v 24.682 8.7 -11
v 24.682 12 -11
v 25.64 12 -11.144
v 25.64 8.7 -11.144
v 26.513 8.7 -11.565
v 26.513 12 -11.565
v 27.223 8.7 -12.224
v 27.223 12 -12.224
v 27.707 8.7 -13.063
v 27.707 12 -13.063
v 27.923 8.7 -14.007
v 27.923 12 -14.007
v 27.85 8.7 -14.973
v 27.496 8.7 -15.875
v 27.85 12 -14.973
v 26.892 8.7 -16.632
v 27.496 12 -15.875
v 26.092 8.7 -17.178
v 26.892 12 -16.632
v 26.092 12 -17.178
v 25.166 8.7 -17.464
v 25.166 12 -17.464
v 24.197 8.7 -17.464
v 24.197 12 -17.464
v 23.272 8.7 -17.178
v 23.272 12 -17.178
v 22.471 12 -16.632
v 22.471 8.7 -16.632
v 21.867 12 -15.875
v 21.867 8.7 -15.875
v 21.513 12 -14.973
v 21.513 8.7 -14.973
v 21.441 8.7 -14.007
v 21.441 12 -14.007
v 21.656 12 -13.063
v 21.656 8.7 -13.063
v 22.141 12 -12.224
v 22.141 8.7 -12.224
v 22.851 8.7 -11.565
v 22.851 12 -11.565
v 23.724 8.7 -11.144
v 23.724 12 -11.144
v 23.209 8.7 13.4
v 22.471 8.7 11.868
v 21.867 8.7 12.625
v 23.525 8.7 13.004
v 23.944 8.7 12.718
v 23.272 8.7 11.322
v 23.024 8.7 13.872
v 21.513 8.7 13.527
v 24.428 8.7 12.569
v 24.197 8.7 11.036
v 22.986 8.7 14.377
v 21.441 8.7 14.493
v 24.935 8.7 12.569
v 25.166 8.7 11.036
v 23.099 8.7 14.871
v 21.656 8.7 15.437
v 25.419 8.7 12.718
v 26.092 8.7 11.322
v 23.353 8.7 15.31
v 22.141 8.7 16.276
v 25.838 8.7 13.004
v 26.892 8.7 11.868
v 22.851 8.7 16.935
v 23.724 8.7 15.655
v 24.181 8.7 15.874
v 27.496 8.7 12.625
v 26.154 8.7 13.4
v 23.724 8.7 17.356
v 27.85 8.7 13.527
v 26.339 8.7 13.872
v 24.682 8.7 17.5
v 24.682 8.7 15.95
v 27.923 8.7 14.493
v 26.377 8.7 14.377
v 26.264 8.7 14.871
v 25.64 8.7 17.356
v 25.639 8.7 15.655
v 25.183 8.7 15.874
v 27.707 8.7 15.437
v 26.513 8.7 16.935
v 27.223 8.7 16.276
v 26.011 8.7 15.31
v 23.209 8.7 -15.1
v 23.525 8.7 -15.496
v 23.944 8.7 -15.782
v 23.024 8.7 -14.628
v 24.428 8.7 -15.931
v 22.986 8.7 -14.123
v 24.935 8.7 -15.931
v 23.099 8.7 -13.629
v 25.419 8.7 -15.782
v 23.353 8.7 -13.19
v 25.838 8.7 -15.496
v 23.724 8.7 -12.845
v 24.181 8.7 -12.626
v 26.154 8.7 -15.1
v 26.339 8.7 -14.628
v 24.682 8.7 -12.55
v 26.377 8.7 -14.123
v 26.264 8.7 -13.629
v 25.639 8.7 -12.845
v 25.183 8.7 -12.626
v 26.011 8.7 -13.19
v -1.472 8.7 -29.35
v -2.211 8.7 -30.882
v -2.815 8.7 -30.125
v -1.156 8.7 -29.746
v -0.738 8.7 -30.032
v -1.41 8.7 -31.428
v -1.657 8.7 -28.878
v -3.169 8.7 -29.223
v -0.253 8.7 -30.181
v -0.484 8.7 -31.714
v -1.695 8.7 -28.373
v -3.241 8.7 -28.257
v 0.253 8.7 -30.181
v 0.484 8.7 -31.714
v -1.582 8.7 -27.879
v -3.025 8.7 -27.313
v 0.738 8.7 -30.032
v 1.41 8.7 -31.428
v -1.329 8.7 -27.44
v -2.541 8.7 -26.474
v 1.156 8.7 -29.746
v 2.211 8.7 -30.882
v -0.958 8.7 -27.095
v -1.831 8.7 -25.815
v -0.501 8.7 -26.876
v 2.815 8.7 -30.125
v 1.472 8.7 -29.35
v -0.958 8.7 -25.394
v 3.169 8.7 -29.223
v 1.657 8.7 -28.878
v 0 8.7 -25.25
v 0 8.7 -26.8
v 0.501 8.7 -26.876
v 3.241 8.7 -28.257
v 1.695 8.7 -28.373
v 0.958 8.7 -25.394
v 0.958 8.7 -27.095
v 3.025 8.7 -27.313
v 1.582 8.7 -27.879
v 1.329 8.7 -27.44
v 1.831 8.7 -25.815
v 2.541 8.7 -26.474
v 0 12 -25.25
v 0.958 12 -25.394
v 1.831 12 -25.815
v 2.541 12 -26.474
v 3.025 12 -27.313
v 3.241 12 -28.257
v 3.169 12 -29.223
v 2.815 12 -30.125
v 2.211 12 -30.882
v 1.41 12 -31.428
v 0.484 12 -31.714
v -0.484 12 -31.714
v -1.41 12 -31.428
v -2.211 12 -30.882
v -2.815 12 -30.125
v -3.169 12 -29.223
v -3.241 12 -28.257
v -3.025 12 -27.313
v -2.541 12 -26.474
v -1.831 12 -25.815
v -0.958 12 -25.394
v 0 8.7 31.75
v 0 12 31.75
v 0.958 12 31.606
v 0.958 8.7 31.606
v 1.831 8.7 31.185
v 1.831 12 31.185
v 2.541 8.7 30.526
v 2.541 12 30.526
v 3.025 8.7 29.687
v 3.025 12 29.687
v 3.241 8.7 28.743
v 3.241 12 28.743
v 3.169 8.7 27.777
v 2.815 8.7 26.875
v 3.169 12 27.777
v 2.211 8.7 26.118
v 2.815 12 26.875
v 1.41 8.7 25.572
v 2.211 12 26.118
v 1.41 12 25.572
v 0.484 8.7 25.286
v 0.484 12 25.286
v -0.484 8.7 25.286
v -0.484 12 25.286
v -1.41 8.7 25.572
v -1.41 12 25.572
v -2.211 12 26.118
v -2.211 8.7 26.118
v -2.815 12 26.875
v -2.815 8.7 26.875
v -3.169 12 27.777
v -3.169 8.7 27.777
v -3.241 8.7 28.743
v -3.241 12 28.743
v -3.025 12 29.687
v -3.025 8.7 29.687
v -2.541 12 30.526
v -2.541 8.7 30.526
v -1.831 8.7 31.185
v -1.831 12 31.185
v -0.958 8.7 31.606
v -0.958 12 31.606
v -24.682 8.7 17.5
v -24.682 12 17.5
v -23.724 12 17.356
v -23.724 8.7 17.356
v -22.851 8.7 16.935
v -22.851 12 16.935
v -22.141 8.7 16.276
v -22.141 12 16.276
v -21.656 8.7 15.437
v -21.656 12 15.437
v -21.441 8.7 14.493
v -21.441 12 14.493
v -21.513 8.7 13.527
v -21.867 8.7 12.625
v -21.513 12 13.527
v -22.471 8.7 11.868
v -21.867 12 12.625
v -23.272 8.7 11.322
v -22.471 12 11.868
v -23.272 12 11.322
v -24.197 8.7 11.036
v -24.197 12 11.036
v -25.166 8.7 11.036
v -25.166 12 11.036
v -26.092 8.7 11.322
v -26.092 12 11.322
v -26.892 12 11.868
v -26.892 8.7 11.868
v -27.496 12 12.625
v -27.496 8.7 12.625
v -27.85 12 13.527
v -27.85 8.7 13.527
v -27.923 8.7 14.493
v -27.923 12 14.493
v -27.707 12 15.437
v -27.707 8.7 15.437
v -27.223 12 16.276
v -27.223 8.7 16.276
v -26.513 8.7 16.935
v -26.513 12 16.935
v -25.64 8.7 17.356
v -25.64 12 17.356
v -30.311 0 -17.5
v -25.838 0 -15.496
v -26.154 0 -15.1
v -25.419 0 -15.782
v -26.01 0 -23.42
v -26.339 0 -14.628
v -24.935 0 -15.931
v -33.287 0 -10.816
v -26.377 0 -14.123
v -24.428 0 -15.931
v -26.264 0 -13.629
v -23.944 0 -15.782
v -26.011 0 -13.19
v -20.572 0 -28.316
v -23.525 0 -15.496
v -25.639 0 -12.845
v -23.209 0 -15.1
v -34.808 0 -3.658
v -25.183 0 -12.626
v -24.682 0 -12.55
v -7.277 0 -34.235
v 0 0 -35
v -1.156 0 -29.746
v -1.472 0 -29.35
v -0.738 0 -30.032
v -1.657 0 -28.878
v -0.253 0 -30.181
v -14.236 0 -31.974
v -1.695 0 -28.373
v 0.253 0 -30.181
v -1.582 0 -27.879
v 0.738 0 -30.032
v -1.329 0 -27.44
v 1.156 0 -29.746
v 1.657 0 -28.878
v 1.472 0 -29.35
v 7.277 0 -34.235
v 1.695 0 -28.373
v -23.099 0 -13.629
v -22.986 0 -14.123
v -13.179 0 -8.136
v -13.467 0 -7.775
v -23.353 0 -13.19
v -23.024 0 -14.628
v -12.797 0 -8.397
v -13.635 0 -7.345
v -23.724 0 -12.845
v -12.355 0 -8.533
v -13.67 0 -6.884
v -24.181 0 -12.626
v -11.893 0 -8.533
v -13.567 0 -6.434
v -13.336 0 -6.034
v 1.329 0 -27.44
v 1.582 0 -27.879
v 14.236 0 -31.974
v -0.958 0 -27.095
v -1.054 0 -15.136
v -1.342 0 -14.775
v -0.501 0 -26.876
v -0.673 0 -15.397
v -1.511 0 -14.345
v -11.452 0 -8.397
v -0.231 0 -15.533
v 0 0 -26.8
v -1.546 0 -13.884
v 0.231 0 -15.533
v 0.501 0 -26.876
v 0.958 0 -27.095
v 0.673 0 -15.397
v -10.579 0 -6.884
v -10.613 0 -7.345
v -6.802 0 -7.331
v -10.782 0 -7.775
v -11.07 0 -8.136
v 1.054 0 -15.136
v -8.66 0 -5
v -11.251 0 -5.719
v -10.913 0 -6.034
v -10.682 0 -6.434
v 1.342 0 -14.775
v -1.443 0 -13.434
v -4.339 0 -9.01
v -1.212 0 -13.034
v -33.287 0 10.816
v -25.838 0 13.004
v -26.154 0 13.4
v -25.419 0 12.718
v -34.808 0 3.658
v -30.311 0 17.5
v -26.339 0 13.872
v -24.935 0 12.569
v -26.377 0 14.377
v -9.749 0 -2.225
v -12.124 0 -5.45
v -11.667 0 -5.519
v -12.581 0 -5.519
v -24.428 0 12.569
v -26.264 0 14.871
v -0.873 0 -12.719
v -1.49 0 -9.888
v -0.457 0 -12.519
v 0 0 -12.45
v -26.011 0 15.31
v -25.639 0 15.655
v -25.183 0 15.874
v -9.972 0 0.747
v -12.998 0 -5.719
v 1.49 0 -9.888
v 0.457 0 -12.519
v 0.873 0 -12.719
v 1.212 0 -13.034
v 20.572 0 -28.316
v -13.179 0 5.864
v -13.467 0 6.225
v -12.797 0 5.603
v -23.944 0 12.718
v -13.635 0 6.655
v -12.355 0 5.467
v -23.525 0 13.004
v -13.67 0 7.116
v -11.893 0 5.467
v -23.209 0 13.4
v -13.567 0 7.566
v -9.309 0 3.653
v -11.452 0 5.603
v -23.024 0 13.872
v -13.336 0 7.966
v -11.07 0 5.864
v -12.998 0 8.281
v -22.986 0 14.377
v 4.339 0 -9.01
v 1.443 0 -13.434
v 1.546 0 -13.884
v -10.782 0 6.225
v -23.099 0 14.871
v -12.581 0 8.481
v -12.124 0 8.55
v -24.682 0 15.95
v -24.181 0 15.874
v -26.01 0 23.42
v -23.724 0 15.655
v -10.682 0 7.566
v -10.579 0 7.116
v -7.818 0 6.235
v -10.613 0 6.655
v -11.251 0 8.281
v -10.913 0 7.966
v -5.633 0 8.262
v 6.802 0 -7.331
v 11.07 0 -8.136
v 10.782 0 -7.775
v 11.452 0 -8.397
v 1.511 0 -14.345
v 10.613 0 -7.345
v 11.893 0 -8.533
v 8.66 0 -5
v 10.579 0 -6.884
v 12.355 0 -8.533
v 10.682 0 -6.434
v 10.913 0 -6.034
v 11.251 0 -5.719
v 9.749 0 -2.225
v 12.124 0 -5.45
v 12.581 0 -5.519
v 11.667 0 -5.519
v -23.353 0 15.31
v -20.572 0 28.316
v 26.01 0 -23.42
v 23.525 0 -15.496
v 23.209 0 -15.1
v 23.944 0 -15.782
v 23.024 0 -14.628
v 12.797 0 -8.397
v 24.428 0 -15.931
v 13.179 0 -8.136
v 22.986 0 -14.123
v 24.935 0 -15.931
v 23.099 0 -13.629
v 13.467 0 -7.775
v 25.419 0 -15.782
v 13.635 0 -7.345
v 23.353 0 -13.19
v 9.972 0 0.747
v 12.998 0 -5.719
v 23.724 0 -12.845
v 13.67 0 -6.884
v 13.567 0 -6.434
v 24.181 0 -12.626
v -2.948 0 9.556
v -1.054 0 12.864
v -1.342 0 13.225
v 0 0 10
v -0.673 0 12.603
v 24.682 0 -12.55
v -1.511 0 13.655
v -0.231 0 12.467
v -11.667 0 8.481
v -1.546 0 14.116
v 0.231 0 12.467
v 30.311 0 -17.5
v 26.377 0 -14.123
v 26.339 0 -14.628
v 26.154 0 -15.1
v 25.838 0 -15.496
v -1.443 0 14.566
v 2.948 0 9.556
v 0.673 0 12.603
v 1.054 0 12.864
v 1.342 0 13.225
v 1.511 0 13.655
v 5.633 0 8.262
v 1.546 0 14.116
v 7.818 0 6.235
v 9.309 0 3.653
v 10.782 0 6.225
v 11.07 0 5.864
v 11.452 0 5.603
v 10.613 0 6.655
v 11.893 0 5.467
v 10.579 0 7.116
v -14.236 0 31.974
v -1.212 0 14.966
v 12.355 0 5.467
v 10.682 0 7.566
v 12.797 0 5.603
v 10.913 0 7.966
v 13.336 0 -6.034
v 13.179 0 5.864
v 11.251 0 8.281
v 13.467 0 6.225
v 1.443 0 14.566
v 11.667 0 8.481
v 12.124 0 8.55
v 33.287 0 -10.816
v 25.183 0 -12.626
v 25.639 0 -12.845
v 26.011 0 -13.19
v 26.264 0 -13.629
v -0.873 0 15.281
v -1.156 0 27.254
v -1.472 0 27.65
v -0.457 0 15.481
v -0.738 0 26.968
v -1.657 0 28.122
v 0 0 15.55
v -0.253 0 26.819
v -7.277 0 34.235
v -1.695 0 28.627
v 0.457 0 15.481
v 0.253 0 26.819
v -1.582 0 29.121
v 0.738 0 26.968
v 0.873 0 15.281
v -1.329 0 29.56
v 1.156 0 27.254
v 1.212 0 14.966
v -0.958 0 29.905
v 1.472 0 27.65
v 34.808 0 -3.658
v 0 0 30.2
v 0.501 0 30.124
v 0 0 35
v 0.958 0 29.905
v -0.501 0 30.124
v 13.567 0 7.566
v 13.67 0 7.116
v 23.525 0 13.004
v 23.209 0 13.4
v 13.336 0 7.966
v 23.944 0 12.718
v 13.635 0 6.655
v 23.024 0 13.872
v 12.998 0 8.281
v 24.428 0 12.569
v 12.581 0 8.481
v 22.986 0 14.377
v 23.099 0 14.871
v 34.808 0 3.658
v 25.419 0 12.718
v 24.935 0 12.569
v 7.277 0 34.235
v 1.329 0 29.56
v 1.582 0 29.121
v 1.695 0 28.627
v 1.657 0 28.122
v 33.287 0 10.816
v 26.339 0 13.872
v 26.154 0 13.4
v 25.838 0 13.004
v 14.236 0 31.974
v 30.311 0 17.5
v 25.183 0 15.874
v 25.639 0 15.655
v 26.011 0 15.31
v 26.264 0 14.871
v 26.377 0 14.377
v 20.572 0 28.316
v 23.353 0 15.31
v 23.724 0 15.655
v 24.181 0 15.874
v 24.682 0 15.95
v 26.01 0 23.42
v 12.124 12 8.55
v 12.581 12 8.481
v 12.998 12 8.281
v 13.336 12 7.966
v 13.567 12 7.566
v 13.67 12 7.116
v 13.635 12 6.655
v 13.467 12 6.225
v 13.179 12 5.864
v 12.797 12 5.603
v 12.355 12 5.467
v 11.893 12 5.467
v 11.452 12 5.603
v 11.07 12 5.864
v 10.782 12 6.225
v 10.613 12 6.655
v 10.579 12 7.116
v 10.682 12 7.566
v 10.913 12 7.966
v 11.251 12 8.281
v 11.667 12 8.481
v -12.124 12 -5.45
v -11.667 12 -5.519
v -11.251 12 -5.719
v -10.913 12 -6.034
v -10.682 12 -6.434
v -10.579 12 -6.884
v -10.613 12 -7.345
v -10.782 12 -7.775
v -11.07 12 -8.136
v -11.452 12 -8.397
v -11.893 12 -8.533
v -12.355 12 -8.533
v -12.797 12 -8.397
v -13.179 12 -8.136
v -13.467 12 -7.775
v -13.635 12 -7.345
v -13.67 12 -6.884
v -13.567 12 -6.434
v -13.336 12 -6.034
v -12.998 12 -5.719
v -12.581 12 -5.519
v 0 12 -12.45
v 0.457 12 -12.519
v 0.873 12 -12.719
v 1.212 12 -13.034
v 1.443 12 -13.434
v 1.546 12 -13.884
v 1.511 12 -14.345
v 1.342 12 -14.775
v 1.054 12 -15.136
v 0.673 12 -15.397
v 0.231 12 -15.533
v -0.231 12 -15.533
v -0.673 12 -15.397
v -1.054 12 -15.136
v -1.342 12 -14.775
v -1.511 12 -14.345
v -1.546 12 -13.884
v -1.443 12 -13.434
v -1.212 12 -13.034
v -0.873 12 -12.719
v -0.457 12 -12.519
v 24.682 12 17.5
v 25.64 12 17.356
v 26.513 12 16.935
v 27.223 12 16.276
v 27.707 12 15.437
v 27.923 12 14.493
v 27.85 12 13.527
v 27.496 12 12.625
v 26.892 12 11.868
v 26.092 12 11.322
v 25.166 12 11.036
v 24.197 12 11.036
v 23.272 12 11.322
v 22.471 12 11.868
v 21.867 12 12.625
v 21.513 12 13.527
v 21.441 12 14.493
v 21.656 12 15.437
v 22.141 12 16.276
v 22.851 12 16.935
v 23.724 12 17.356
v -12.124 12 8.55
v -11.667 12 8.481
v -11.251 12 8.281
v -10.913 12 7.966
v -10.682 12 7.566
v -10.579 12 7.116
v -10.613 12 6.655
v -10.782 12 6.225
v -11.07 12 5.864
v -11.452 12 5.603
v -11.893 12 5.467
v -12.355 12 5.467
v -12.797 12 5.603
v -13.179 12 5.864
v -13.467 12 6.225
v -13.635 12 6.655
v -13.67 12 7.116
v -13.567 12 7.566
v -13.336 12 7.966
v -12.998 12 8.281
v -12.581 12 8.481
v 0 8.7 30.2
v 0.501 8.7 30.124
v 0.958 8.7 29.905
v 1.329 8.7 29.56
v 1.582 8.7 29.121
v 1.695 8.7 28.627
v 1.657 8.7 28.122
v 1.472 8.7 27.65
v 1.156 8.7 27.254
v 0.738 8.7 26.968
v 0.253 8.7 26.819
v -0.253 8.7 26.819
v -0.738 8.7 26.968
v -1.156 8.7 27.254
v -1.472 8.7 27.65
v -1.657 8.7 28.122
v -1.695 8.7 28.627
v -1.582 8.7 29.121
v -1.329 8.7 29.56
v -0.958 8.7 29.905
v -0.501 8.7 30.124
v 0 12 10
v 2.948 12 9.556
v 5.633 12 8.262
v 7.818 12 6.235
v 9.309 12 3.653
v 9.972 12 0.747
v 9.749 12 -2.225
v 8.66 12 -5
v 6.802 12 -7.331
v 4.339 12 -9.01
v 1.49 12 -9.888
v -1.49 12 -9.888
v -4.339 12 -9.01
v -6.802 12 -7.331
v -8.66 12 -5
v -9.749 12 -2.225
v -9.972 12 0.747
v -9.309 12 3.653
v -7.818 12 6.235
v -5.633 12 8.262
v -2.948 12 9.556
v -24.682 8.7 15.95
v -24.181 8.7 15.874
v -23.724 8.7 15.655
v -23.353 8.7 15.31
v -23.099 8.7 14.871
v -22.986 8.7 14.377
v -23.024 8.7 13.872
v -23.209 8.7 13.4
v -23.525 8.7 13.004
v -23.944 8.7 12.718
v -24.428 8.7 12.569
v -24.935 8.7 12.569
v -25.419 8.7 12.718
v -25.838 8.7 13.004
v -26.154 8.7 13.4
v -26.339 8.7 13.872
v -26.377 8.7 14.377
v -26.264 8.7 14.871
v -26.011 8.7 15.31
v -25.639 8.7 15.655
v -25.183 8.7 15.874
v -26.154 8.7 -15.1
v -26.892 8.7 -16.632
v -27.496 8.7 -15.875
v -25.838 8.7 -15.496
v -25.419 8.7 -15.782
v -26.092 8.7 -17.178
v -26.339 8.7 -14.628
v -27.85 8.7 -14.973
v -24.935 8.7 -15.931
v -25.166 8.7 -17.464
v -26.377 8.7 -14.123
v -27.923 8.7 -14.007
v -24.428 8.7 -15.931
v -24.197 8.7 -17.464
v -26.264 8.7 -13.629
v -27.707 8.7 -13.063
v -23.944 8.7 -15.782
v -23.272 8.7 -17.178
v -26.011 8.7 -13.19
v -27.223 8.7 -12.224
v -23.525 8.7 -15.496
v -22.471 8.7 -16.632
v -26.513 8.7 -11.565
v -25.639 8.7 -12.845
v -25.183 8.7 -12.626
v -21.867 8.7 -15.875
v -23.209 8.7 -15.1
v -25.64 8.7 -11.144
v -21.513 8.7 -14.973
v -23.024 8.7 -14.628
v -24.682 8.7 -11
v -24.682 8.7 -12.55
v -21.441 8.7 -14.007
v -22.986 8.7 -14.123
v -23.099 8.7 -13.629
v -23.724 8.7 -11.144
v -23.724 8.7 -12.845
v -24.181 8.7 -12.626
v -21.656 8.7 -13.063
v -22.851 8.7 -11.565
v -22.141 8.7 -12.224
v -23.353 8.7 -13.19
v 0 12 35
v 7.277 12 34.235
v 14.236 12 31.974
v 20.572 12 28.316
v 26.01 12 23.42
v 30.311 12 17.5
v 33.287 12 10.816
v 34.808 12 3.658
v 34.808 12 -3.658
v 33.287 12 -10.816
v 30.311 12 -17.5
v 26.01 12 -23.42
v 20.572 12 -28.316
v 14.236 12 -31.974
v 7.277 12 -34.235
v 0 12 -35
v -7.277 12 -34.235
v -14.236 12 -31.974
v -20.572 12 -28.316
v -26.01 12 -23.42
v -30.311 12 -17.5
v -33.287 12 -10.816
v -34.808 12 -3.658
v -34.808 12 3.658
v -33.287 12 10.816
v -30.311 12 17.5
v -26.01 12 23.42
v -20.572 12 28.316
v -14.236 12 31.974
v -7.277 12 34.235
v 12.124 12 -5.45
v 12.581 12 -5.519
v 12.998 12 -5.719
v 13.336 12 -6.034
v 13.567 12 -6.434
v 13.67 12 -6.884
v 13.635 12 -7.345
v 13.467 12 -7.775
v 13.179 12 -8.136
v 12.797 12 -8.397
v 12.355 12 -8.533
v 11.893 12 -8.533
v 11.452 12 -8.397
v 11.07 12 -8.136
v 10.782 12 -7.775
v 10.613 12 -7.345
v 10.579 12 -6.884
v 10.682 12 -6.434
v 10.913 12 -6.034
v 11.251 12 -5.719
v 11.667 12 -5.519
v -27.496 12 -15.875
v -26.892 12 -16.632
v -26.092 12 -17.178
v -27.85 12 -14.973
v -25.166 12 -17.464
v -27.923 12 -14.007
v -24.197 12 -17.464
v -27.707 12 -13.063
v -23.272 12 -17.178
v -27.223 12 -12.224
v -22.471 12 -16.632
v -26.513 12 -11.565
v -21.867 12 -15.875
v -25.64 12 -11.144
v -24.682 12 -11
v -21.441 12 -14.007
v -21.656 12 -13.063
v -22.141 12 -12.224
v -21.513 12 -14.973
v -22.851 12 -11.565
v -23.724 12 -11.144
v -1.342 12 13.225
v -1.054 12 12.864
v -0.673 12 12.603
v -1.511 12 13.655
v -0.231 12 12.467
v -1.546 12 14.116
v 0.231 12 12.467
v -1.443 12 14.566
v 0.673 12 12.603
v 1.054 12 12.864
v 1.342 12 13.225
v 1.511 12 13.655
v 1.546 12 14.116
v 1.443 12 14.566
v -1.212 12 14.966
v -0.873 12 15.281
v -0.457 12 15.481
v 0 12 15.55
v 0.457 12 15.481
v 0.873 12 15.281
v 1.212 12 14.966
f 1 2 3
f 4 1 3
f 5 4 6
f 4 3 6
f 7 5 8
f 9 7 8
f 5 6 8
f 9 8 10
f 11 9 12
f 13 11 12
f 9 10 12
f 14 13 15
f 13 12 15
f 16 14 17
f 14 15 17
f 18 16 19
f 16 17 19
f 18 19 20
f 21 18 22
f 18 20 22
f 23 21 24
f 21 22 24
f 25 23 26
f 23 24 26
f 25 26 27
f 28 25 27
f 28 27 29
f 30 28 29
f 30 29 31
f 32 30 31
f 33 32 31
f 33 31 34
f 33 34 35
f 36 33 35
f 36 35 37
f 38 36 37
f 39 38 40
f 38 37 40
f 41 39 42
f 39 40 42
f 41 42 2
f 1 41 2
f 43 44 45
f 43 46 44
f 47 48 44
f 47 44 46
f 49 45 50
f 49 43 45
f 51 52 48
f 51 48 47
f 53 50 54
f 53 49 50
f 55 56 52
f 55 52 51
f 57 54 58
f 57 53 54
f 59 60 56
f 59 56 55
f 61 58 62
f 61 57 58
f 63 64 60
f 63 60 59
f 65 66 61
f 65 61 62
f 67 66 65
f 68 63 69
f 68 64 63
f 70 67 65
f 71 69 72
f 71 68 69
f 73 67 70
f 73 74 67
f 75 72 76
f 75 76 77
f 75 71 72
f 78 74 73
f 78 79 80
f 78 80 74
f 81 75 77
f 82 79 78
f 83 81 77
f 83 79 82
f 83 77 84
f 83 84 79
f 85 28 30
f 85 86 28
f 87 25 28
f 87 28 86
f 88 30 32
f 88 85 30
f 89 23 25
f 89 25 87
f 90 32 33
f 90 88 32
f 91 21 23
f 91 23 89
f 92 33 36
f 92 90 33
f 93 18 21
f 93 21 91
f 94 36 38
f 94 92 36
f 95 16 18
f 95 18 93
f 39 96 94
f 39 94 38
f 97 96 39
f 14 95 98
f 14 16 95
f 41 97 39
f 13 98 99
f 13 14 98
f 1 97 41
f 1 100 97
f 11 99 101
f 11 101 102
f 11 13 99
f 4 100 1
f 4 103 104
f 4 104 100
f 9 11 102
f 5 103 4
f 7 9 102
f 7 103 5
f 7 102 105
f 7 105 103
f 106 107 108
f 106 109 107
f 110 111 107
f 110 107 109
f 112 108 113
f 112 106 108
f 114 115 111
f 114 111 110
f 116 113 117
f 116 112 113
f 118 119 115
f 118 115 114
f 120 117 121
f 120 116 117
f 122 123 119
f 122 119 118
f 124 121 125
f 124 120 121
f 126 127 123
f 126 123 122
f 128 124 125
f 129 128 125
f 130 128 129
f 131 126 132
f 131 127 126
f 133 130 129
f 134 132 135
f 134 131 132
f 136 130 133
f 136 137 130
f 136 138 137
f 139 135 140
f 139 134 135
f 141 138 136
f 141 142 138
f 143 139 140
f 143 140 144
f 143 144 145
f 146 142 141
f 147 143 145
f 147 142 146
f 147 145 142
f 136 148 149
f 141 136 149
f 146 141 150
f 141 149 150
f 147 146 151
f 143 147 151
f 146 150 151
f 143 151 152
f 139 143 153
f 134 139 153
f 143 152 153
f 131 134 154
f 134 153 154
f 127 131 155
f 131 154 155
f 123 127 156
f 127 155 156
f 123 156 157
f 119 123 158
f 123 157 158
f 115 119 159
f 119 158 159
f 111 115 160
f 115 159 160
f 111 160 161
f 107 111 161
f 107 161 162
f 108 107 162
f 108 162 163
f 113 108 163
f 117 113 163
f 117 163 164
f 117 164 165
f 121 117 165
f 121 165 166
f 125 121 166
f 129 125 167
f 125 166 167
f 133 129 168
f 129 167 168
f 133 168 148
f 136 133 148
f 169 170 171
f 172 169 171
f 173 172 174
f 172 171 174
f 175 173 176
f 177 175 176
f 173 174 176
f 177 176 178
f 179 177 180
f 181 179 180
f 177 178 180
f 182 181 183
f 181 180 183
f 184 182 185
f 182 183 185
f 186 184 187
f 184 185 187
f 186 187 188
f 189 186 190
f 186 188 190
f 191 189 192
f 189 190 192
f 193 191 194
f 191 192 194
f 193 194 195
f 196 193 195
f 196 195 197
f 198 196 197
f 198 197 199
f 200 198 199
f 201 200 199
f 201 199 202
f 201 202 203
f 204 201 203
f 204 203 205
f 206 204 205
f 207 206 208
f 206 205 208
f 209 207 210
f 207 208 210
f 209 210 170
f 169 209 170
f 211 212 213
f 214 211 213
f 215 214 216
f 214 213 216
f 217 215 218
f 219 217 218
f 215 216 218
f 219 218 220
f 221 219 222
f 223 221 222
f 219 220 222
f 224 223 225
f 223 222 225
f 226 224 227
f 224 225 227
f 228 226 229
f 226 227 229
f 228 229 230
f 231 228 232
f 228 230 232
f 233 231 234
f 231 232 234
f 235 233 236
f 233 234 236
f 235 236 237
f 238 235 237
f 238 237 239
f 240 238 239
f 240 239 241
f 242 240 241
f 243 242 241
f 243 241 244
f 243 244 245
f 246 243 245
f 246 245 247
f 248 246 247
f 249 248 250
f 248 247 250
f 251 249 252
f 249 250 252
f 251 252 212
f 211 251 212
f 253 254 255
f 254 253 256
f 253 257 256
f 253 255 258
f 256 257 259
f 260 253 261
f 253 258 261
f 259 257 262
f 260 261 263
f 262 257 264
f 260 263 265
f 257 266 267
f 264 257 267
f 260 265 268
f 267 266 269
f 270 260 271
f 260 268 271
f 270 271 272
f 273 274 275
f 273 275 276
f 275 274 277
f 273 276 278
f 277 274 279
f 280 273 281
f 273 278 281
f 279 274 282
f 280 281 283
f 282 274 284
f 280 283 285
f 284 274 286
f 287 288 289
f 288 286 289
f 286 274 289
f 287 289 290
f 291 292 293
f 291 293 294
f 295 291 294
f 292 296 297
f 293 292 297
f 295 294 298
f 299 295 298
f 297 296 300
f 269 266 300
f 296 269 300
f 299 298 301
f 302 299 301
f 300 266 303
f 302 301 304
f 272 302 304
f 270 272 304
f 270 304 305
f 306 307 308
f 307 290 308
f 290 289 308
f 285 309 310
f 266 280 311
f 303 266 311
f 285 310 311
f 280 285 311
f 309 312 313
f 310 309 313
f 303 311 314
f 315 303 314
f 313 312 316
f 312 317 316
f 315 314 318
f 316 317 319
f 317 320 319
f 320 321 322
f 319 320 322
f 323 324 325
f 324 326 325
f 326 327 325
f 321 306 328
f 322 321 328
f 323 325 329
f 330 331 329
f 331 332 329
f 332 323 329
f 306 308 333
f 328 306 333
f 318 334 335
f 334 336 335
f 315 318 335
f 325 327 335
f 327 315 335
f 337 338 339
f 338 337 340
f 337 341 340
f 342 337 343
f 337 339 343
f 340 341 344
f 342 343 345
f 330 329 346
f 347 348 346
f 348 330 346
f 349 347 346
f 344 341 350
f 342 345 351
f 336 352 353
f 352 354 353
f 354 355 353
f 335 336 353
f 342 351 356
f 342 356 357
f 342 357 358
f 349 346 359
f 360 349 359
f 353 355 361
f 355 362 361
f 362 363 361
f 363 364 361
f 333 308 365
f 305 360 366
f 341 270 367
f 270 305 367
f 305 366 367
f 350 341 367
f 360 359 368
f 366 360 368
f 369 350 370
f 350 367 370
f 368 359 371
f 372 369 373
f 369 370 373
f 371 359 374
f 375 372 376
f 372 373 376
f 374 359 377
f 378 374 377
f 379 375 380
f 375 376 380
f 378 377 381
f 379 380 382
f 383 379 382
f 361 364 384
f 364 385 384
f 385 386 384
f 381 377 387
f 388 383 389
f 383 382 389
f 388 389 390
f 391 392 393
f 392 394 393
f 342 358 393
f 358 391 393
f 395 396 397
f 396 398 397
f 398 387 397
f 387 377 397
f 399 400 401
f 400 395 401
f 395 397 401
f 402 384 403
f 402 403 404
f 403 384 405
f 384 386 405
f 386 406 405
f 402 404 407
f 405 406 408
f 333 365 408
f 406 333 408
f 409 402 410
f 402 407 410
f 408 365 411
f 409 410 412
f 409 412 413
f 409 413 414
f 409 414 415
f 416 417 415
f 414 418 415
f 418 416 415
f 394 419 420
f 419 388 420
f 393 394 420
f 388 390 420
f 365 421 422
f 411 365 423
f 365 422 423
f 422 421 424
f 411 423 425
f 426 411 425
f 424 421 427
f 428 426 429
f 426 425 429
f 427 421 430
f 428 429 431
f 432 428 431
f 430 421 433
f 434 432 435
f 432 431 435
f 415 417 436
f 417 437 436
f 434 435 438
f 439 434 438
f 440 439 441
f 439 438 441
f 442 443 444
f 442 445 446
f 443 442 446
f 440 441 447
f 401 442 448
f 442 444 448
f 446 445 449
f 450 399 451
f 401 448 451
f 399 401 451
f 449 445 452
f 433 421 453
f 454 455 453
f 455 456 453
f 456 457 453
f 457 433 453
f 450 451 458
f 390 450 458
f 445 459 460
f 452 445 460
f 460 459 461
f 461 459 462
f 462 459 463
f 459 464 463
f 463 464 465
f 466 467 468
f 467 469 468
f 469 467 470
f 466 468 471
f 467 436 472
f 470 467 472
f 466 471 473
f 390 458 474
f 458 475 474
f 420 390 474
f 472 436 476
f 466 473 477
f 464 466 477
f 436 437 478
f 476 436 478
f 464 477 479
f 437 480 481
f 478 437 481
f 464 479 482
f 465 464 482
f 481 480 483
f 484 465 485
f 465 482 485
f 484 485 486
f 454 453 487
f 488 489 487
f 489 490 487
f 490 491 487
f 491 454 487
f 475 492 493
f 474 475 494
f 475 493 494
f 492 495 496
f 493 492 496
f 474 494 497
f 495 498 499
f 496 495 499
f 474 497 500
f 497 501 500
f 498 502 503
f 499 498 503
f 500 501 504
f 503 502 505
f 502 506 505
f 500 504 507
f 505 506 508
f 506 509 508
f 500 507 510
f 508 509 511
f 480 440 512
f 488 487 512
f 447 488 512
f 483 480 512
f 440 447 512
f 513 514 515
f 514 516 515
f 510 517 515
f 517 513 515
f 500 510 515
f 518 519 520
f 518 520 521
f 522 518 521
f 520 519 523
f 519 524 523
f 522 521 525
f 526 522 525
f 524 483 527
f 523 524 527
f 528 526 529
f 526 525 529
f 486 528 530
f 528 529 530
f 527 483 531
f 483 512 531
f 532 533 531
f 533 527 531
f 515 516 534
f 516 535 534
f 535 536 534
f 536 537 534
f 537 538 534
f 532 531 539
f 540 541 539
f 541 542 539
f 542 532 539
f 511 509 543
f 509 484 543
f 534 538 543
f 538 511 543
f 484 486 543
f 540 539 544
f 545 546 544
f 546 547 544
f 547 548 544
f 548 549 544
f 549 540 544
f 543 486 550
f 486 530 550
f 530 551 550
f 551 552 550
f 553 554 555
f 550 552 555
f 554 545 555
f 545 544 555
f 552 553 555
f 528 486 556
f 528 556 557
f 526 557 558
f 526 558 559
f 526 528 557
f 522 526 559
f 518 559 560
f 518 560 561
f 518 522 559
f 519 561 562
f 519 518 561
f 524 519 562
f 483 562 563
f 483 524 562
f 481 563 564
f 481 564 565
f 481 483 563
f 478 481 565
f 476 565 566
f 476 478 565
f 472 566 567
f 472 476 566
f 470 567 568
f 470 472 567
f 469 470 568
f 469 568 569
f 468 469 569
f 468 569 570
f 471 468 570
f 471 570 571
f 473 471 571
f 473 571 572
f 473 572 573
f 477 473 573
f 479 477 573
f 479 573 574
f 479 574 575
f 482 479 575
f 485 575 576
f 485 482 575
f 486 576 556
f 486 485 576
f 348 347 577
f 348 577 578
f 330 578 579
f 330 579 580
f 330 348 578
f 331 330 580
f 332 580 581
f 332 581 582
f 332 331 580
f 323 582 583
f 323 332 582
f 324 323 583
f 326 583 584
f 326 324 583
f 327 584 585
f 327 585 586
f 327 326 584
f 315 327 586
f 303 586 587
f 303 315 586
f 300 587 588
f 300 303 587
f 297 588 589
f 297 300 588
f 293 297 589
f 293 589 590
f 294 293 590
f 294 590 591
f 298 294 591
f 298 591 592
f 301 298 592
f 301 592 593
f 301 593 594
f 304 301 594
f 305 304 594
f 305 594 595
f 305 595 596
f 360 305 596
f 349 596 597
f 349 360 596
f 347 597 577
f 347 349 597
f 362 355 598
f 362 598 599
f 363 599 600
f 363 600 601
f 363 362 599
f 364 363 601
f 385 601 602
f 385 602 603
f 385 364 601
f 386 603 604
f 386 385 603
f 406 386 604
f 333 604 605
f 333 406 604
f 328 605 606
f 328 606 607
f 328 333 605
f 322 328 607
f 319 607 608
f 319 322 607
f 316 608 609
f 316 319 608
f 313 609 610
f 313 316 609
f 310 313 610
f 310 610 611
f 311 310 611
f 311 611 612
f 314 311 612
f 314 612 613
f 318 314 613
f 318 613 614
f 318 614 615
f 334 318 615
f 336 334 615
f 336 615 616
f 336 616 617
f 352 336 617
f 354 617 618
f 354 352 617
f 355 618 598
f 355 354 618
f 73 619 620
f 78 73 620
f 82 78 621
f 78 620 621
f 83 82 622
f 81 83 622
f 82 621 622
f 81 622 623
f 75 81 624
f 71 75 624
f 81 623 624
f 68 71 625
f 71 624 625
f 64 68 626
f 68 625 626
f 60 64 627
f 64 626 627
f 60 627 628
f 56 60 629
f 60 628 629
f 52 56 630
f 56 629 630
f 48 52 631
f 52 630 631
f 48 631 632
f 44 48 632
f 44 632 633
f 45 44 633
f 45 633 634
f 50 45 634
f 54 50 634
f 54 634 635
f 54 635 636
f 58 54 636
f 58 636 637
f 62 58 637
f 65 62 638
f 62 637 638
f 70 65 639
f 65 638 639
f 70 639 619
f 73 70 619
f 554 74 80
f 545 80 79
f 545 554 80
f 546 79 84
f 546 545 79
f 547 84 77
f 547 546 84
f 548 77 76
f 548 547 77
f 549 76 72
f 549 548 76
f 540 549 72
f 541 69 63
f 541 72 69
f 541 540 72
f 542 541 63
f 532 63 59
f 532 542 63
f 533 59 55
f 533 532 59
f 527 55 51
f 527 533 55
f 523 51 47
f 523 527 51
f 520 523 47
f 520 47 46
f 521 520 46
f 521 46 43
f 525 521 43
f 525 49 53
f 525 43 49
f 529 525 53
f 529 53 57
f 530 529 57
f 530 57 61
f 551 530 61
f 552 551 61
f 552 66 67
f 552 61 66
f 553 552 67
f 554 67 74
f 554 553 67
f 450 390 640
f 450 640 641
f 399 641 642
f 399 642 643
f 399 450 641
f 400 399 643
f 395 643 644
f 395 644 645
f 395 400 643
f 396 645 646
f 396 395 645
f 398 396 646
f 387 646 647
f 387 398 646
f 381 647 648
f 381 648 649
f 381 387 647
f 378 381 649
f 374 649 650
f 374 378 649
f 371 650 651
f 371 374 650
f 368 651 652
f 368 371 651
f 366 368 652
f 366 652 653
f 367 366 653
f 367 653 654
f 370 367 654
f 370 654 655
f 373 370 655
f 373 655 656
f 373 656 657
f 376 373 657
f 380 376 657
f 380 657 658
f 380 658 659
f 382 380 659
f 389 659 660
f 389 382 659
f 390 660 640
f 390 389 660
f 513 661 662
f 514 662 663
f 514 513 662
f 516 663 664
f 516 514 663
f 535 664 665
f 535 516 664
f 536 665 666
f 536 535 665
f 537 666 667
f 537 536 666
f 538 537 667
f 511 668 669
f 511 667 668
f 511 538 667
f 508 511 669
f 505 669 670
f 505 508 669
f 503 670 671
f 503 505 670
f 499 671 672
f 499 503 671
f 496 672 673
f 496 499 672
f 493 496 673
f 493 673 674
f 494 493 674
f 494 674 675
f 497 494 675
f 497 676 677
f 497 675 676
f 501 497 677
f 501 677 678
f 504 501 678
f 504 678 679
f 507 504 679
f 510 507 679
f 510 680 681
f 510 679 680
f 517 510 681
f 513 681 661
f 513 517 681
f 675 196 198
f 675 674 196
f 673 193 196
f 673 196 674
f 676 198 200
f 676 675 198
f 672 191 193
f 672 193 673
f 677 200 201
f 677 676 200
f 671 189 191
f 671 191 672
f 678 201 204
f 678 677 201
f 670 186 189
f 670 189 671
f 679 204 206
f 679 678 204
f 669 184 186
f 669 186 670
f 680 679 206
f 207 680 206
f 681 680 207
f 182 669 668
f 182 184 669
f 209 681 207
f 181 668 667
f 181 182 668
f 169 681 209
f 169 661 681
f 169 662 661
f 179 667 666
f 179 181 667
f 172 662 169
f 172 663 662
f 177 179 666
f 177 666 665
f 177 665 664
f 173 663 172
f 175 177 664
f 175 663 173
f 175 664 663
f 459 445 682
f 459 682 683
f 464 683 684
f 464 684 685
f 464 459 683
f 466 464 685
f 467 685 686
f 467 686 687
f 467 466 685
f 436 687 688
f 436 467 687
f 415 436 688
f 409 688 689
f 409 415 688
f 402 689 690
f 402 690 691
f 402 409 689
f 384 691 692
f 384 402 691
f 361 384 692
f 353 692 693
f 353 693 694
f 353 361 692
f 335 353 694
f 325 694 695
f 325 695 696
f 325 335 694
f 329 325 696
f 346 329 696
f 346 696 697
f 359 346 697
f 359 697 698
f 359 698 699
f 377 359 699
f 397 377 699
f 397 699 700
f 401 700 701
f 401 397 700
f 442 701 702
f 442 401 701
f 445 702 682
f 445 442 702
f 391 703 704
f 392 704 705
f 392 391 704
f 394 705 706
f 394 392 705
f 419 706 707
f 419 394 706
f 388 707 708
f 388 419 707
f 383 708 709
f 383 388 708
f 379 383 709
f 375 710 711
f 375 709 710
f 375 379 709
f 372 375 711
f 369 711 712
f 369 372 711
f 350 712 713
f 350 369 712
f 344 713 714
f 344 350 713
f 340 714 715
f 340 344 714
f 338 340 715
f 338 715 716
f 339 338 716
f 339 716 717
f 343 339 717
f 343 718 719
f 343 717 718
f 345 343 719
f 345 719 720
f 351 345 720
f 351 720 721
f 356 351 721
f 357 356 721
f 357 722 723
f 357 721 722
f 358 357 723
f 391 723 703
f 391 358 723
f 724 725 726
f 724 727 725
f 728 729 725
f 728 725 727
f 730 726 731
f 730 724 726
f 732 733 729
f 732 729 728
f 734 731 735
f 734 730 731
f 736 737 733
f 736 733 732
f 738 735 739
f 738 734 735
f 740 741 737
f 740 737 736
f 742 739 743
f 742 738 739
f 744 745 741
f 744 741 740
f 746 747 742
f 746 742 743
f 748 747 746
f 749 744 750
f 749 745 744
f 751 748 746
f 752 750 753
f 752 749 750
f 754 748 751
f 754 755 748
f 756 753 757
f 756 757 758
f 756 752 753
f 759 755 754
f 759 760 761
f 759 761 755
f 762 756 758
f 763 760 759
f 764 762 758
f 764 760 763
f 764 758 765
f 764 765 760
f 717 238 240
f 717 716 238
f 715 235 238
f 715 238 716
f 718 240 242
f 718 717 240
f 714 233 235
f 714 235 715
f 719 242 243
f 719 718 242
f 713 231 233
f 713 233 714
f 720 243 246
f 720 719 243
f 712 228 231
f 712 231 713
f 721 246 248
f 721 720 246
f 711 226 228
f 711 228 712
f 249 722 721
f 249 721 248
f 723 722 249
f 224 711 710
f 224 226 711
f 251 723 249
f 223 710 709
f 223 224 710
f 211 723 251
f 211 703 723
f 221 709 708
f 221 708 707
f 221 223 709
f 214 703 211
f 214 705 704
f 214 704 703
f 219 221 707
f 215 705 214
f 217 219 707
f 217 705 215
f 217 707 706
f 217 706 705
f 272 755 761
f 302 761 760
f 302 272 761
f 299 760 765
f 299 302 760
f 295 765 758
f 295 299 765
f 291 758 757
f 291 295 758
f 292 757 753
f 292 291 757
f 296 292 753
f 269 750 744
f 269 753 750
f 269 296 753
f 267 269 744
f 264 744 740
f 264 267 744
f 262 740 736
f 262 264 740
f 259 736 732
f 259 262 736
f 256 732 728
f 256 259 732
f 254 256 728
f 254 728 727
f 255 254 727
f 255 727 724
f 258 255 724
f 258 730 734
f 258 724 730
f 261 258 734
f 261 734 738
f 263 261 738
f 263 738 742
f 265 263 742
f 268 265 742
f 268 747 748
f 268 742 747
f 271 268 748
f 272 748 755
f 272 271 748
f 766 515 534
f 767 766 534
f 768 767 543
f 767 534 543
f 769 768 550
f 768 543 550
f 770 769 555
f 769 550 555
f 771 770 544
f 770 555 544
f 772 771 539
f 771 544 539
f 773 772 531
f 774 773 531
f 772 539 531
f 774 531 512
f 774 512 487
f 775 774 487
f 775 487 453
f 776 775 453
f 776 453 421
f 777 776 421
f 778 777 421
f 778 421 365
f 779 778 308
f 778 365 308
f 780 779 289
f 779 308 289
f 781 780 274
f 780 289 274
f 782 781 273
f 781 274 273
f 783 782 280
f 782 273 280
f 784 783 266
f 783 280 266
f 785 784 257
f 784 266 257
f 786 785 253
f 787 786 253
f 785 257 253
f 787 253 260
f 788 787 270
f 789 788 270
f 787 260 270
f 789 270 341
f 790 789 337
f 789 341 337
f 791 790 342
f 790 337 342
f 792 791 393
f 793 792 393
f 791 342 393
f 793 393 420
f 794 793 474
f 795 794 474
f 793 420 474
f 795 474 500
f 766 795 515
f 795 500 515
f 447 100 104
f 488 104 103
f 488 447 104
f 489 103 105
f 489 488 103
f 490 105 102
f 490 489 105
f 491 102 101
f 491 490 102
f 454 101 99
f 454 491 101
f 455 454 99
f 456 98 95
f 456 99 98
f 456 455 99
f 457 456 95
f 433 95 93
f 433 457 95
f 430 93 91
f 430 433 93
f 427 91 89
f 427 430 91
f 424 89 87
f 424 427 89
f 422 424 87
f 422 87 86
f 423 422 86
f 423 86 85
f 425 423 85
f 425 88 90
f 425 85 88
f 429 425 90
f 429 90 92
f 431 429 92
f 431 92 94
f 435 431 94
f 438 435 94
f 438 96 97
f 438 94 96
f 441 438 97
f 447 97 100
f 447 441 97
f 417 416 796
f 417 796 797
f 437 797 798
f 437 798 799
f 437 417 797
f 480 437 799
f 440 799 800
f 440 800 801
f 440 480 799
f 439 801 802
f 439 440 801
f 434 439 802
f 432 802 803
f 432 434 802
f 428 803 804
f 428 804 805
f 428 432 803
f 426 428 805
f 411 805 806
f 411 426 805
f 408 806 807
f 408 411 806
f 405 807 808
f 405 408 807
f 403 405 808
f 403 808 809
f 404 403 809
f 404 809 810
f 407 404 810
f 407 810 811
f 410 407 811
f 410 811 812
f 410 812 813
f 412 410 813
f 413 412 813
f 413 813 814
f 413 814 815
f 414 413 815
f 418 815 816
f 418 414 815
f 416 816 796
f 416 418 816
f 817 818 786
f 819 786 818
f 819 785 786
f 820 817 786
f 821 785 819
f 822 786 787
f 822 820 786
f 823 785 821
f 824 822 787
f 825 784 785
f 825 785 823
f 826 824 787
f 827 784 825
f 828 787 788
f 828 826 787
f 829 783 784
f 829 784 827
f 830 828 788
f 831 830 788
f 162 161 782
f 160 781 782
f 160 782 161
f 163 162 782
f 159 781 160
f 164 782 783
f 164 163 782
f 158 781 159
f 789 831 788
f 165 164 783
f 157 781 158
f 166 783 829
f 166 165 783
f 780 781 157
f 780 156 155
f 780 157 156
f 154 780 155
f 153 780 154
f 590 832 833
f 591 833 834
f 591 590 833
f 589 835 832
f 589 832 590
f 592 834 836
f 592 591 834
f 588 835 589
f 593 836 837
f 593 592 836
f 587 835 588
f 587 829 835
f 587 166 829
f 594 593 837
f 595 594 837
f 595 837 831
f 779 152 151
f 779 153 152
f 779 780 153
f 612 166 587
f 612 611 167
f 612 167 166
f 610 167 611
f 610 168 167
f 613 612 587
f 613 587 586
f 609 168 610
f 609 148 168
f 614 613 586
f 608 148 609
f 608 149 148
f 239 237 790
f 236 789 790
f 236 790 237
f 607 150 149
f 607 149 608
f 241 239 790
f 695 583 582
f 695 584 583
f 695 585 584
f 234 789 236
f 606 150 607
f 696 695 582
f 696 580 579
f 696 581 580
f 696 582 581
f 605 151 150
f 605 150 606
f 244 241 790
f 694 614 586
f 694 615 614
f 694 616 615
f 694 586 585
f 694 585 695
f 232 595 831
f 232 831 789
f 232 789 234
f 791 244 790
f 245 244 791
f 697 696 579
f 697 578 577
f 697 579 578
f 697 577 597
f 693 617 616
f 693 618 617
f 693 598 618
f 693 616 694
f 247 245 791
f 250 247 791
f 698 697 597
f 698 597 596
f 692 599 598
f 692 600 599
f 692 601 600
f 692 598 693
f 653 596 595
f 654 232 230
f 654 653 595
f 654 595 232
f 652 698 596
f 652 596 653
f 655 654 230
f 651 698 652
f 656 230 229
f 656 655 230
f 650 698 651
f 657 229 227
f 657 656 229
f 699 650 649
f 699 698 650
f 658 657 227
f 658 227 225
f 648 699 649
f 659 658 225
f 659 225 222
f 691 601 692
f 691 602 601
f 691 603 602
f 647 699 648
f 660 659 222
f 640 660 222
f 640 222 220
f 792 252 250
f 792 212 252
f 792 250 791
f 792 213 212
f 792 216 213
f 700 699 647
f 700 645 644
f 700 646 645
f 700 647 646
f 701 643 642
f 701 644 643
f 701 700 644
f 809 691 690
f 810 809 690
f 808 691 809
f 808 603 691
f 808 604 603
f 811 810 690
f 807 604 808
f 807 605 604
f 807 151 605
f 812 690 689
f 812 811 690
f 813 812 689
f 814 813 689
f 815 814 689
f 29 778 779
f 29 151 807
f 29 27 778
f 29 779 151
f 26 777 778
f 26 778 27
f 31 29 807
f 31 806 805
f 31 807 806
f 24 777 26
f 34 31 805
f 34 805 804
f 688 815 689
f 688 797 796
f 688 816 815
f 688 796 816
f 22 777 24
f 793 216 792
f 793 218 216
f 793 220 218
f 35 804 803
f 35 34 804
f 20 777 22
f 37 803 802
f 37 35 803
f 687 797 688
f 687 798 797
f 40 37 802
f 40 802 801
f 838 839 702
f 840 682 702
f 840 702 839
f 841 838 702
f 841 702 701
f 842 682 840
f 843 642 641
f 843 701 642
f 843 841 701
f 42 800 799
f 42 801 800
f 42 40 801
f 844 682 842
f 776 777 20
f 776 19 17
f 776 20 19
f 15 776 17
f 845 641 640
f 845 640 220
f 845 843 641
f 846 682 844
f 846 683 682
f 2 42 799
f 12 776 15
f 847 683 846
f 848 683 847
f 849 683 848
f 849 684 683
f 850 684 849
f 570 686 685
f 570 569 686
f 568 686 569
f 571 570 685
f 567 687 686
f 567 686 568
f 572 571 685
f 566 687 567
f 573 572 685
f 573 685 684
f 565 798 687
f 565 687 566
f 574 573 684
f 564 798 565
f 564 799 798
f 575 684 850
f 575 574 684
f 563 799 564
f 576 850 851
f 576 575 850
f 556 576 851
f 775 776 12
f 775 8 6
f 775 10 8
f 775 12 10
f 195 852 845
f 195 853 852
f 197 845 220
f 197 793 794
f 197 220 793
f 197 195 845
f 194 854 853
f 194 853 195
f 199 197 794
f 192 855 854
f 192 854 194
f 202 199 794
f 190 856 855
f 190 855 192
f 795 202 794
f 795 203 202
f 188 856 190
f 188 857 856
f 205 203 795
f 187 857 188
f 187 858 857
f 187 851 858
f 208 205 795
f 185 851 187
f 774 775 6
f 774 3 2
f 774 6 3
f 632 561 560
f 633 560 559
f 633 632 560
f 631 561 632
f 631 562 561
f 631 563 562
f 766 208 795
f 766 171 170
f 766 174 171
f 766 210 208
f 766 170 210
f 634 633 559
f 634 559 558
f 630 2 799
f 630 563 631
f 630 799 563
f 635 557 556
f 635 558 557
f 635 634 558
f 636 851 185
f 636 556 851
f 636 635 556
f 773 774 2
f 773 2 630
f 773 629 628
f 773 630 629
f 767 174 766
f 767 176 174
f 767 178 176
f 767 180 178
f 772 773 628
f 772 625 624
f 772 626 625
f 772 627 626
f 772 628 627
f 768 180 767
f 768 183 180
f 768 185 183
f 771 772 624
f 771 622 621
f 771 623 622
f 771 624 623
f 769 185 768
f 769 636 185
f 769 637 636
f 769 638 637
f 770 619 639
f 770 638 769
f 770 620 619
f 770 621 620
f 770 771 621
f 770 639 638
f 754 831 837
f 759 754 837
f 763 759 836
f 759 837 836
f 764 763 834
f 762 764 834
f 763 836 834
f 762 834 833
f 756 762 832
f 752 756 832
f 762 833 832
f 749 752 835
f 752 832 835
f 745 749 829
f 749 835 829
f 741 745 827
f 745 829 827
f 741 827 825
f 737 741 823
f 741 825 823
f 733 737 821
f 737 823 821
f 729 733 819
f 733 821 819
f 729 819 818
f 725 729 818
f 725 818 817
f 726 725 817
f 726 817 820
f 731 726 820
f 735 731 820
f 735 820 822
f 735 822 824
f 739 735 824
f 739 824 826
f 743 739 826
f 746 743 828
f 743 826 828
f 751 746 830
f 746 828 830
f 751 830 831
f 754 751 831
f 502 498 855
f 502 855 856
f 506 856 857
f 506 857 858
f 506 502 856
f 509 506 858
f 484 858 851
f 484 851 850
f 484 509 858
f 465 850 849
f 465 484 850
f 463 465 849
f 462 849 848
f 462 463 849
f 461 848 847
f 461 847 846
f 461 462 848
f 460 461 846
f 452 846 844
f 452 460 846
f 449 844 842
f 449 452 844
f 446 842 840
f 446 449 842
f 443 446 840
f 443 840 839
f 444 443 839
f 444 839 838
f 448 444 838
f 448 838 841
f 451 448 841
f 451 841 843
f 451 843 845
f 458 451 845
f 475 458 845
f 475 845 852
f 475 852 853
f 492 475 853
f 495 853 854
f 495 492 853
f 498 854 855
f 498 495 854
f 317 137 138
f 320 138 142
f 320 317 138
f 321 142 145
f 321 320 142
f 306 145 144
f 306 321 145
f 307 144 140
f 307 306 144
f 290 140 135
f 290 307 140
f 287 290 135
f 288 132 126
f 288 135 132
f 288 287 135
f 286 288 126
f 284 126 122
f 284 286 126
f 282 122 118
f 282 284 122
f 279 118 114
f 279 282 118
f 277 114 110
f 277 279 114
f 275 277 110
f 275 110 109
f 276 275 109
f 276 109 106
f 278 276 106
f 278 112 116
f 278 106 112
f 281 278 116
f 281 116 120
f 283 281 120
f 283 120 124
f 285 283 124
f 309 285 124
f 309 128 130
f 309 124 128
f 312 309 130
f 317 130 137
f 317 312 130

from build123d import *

# Parameters (mm, degrees)
SKETCH_1_R          = 35
SKETCH_1_R_2        = 10
SKETCH_1_R_3        = 1.55
SKETCH_1_R_4        = 1.7
EXTRUDE_1_DEPTH     = 12
SKETCH_2_R          = 3.25
CUT_EXTRUDE_1_DEPTH = 3.3


with BuildPart() as part:
    # 草图1 → 凸台-拉伸1 (new body)
    with BuildSketch(Plane(origin=(0, 0, 0), x_dir=(1, 0, 0), z_dir=(0, 1, 0))):
        with Locations(Location((0, 0, 0), (0, 0, 270))):
            Circle(SKETCH_1_R)
        with Locations(Location((0, 0, 0), (0, 0, 270))):
            Circle(SKETCH_1_R_2, mode=Mode.SUBTRACT)
        with Locations(Location((0, 14, 0), (0, 0, 270))):
            Circle(SKETCH_1_R_3, mode=Mode.SUBTRACT)
        with Locations(Location((12.124355653, 7, 0), (0, 0, 270))):
            Circle(SKETCH_1_R_3, mode=Mode.SUBTRACT)
        with Locations(Location((12.124355653, -7, 0), (0, 0, 270))):
            Circle(SKETCH_1_R_3, mode=Mode.SUBTRACT)
        with Locations(Location((0, -14, 0), (0, 0, 270))):
            Circle(SKETCH_1_R_3, mode=Mode.SUBTRACT)
        with Locations(Location((-12.124355653, -7, 0), (0, 0, 270))):
            Circle(SKETCH_1_R_3, mode=Mode.SUBTRACT)
        with Locations(Location((-12.124355653, 7, 0), (0, 0, 270))):
            Circle(SKETCH_1_R_3, mode=Mode.SUBTRACT)
        with Locations(Location((0, 28.5, 0), (0, 0, 270))):
            Circle(SKETCH_1_R_4, mode=Mode.SUBTRACT)
        with Locations(Location((24.681724008, 14.25, 0), (0, 0, 270))):
            Circle(SKETCH_1_R_4, mode=Mode.SUBTRACT)
        with Locations(Location((24.681724008, -14.25, 0), (0, 0, 270))):
            Circle(SKETCH_1_R_4, mode=Mode.SUBTRACT)
        with Locations(Location((0, -28.5, 0), (0, 0, 270))):
            Circle(SKETCH_1_R_4, mode=Mode.SUBTRACT)
        with Locations(Location((-24.681724008, -14.25, 0), (0, 0, 270))):
            Circle(SKETCH_1_R_4, mode=Mode.SUBTRACT)
        with Locations(Location((-24.681724008, 14.25, 0), (0, 0, 270))):
            Circle(SKETCH_1_R_4, mode=Mode.SUBTRACT)
    extrude(amount=EXTRUDE_1_DEPTH)

    # 草图2 → 切除-拉伸1 (cut)
    with BuildSketch(Plane(origin=(0, 12, 0), x_dir=(1, 0, 0), z_dir=(0, 1, 0))):
        with Locations(Location((0, 28.5, 0), (0, 0, 270))):
            Circle(SKETCH_2_R)
        with Locations(Location((24.681724008, 14.25, 0), (0, 0, 270))):
            Circle(SKETCH_2_R)
        with Locations(Location((24.681724008, -14.25, 0), (0, 0, 270))):
            Circle(SKETCH_2_R)
        with Locations(Location((0, -28.5, 0), (0, 0, 270))):
            Circle(SKETCH_2_R)
        with Locations(Location((-24.681724008, -14.25, 0), (0, 0, 270))):
            Circle(SKETCH_2_R)
        with Locations(Location((-24.681724008, 14.25, 0), (0, 0, 270))):
            Circle(SKETCH_2_R)
    extrude(amount=-CUT_EXTRUDE_1_DEPTH, mode=Mode.SUBTRACT)


solid = part.part
